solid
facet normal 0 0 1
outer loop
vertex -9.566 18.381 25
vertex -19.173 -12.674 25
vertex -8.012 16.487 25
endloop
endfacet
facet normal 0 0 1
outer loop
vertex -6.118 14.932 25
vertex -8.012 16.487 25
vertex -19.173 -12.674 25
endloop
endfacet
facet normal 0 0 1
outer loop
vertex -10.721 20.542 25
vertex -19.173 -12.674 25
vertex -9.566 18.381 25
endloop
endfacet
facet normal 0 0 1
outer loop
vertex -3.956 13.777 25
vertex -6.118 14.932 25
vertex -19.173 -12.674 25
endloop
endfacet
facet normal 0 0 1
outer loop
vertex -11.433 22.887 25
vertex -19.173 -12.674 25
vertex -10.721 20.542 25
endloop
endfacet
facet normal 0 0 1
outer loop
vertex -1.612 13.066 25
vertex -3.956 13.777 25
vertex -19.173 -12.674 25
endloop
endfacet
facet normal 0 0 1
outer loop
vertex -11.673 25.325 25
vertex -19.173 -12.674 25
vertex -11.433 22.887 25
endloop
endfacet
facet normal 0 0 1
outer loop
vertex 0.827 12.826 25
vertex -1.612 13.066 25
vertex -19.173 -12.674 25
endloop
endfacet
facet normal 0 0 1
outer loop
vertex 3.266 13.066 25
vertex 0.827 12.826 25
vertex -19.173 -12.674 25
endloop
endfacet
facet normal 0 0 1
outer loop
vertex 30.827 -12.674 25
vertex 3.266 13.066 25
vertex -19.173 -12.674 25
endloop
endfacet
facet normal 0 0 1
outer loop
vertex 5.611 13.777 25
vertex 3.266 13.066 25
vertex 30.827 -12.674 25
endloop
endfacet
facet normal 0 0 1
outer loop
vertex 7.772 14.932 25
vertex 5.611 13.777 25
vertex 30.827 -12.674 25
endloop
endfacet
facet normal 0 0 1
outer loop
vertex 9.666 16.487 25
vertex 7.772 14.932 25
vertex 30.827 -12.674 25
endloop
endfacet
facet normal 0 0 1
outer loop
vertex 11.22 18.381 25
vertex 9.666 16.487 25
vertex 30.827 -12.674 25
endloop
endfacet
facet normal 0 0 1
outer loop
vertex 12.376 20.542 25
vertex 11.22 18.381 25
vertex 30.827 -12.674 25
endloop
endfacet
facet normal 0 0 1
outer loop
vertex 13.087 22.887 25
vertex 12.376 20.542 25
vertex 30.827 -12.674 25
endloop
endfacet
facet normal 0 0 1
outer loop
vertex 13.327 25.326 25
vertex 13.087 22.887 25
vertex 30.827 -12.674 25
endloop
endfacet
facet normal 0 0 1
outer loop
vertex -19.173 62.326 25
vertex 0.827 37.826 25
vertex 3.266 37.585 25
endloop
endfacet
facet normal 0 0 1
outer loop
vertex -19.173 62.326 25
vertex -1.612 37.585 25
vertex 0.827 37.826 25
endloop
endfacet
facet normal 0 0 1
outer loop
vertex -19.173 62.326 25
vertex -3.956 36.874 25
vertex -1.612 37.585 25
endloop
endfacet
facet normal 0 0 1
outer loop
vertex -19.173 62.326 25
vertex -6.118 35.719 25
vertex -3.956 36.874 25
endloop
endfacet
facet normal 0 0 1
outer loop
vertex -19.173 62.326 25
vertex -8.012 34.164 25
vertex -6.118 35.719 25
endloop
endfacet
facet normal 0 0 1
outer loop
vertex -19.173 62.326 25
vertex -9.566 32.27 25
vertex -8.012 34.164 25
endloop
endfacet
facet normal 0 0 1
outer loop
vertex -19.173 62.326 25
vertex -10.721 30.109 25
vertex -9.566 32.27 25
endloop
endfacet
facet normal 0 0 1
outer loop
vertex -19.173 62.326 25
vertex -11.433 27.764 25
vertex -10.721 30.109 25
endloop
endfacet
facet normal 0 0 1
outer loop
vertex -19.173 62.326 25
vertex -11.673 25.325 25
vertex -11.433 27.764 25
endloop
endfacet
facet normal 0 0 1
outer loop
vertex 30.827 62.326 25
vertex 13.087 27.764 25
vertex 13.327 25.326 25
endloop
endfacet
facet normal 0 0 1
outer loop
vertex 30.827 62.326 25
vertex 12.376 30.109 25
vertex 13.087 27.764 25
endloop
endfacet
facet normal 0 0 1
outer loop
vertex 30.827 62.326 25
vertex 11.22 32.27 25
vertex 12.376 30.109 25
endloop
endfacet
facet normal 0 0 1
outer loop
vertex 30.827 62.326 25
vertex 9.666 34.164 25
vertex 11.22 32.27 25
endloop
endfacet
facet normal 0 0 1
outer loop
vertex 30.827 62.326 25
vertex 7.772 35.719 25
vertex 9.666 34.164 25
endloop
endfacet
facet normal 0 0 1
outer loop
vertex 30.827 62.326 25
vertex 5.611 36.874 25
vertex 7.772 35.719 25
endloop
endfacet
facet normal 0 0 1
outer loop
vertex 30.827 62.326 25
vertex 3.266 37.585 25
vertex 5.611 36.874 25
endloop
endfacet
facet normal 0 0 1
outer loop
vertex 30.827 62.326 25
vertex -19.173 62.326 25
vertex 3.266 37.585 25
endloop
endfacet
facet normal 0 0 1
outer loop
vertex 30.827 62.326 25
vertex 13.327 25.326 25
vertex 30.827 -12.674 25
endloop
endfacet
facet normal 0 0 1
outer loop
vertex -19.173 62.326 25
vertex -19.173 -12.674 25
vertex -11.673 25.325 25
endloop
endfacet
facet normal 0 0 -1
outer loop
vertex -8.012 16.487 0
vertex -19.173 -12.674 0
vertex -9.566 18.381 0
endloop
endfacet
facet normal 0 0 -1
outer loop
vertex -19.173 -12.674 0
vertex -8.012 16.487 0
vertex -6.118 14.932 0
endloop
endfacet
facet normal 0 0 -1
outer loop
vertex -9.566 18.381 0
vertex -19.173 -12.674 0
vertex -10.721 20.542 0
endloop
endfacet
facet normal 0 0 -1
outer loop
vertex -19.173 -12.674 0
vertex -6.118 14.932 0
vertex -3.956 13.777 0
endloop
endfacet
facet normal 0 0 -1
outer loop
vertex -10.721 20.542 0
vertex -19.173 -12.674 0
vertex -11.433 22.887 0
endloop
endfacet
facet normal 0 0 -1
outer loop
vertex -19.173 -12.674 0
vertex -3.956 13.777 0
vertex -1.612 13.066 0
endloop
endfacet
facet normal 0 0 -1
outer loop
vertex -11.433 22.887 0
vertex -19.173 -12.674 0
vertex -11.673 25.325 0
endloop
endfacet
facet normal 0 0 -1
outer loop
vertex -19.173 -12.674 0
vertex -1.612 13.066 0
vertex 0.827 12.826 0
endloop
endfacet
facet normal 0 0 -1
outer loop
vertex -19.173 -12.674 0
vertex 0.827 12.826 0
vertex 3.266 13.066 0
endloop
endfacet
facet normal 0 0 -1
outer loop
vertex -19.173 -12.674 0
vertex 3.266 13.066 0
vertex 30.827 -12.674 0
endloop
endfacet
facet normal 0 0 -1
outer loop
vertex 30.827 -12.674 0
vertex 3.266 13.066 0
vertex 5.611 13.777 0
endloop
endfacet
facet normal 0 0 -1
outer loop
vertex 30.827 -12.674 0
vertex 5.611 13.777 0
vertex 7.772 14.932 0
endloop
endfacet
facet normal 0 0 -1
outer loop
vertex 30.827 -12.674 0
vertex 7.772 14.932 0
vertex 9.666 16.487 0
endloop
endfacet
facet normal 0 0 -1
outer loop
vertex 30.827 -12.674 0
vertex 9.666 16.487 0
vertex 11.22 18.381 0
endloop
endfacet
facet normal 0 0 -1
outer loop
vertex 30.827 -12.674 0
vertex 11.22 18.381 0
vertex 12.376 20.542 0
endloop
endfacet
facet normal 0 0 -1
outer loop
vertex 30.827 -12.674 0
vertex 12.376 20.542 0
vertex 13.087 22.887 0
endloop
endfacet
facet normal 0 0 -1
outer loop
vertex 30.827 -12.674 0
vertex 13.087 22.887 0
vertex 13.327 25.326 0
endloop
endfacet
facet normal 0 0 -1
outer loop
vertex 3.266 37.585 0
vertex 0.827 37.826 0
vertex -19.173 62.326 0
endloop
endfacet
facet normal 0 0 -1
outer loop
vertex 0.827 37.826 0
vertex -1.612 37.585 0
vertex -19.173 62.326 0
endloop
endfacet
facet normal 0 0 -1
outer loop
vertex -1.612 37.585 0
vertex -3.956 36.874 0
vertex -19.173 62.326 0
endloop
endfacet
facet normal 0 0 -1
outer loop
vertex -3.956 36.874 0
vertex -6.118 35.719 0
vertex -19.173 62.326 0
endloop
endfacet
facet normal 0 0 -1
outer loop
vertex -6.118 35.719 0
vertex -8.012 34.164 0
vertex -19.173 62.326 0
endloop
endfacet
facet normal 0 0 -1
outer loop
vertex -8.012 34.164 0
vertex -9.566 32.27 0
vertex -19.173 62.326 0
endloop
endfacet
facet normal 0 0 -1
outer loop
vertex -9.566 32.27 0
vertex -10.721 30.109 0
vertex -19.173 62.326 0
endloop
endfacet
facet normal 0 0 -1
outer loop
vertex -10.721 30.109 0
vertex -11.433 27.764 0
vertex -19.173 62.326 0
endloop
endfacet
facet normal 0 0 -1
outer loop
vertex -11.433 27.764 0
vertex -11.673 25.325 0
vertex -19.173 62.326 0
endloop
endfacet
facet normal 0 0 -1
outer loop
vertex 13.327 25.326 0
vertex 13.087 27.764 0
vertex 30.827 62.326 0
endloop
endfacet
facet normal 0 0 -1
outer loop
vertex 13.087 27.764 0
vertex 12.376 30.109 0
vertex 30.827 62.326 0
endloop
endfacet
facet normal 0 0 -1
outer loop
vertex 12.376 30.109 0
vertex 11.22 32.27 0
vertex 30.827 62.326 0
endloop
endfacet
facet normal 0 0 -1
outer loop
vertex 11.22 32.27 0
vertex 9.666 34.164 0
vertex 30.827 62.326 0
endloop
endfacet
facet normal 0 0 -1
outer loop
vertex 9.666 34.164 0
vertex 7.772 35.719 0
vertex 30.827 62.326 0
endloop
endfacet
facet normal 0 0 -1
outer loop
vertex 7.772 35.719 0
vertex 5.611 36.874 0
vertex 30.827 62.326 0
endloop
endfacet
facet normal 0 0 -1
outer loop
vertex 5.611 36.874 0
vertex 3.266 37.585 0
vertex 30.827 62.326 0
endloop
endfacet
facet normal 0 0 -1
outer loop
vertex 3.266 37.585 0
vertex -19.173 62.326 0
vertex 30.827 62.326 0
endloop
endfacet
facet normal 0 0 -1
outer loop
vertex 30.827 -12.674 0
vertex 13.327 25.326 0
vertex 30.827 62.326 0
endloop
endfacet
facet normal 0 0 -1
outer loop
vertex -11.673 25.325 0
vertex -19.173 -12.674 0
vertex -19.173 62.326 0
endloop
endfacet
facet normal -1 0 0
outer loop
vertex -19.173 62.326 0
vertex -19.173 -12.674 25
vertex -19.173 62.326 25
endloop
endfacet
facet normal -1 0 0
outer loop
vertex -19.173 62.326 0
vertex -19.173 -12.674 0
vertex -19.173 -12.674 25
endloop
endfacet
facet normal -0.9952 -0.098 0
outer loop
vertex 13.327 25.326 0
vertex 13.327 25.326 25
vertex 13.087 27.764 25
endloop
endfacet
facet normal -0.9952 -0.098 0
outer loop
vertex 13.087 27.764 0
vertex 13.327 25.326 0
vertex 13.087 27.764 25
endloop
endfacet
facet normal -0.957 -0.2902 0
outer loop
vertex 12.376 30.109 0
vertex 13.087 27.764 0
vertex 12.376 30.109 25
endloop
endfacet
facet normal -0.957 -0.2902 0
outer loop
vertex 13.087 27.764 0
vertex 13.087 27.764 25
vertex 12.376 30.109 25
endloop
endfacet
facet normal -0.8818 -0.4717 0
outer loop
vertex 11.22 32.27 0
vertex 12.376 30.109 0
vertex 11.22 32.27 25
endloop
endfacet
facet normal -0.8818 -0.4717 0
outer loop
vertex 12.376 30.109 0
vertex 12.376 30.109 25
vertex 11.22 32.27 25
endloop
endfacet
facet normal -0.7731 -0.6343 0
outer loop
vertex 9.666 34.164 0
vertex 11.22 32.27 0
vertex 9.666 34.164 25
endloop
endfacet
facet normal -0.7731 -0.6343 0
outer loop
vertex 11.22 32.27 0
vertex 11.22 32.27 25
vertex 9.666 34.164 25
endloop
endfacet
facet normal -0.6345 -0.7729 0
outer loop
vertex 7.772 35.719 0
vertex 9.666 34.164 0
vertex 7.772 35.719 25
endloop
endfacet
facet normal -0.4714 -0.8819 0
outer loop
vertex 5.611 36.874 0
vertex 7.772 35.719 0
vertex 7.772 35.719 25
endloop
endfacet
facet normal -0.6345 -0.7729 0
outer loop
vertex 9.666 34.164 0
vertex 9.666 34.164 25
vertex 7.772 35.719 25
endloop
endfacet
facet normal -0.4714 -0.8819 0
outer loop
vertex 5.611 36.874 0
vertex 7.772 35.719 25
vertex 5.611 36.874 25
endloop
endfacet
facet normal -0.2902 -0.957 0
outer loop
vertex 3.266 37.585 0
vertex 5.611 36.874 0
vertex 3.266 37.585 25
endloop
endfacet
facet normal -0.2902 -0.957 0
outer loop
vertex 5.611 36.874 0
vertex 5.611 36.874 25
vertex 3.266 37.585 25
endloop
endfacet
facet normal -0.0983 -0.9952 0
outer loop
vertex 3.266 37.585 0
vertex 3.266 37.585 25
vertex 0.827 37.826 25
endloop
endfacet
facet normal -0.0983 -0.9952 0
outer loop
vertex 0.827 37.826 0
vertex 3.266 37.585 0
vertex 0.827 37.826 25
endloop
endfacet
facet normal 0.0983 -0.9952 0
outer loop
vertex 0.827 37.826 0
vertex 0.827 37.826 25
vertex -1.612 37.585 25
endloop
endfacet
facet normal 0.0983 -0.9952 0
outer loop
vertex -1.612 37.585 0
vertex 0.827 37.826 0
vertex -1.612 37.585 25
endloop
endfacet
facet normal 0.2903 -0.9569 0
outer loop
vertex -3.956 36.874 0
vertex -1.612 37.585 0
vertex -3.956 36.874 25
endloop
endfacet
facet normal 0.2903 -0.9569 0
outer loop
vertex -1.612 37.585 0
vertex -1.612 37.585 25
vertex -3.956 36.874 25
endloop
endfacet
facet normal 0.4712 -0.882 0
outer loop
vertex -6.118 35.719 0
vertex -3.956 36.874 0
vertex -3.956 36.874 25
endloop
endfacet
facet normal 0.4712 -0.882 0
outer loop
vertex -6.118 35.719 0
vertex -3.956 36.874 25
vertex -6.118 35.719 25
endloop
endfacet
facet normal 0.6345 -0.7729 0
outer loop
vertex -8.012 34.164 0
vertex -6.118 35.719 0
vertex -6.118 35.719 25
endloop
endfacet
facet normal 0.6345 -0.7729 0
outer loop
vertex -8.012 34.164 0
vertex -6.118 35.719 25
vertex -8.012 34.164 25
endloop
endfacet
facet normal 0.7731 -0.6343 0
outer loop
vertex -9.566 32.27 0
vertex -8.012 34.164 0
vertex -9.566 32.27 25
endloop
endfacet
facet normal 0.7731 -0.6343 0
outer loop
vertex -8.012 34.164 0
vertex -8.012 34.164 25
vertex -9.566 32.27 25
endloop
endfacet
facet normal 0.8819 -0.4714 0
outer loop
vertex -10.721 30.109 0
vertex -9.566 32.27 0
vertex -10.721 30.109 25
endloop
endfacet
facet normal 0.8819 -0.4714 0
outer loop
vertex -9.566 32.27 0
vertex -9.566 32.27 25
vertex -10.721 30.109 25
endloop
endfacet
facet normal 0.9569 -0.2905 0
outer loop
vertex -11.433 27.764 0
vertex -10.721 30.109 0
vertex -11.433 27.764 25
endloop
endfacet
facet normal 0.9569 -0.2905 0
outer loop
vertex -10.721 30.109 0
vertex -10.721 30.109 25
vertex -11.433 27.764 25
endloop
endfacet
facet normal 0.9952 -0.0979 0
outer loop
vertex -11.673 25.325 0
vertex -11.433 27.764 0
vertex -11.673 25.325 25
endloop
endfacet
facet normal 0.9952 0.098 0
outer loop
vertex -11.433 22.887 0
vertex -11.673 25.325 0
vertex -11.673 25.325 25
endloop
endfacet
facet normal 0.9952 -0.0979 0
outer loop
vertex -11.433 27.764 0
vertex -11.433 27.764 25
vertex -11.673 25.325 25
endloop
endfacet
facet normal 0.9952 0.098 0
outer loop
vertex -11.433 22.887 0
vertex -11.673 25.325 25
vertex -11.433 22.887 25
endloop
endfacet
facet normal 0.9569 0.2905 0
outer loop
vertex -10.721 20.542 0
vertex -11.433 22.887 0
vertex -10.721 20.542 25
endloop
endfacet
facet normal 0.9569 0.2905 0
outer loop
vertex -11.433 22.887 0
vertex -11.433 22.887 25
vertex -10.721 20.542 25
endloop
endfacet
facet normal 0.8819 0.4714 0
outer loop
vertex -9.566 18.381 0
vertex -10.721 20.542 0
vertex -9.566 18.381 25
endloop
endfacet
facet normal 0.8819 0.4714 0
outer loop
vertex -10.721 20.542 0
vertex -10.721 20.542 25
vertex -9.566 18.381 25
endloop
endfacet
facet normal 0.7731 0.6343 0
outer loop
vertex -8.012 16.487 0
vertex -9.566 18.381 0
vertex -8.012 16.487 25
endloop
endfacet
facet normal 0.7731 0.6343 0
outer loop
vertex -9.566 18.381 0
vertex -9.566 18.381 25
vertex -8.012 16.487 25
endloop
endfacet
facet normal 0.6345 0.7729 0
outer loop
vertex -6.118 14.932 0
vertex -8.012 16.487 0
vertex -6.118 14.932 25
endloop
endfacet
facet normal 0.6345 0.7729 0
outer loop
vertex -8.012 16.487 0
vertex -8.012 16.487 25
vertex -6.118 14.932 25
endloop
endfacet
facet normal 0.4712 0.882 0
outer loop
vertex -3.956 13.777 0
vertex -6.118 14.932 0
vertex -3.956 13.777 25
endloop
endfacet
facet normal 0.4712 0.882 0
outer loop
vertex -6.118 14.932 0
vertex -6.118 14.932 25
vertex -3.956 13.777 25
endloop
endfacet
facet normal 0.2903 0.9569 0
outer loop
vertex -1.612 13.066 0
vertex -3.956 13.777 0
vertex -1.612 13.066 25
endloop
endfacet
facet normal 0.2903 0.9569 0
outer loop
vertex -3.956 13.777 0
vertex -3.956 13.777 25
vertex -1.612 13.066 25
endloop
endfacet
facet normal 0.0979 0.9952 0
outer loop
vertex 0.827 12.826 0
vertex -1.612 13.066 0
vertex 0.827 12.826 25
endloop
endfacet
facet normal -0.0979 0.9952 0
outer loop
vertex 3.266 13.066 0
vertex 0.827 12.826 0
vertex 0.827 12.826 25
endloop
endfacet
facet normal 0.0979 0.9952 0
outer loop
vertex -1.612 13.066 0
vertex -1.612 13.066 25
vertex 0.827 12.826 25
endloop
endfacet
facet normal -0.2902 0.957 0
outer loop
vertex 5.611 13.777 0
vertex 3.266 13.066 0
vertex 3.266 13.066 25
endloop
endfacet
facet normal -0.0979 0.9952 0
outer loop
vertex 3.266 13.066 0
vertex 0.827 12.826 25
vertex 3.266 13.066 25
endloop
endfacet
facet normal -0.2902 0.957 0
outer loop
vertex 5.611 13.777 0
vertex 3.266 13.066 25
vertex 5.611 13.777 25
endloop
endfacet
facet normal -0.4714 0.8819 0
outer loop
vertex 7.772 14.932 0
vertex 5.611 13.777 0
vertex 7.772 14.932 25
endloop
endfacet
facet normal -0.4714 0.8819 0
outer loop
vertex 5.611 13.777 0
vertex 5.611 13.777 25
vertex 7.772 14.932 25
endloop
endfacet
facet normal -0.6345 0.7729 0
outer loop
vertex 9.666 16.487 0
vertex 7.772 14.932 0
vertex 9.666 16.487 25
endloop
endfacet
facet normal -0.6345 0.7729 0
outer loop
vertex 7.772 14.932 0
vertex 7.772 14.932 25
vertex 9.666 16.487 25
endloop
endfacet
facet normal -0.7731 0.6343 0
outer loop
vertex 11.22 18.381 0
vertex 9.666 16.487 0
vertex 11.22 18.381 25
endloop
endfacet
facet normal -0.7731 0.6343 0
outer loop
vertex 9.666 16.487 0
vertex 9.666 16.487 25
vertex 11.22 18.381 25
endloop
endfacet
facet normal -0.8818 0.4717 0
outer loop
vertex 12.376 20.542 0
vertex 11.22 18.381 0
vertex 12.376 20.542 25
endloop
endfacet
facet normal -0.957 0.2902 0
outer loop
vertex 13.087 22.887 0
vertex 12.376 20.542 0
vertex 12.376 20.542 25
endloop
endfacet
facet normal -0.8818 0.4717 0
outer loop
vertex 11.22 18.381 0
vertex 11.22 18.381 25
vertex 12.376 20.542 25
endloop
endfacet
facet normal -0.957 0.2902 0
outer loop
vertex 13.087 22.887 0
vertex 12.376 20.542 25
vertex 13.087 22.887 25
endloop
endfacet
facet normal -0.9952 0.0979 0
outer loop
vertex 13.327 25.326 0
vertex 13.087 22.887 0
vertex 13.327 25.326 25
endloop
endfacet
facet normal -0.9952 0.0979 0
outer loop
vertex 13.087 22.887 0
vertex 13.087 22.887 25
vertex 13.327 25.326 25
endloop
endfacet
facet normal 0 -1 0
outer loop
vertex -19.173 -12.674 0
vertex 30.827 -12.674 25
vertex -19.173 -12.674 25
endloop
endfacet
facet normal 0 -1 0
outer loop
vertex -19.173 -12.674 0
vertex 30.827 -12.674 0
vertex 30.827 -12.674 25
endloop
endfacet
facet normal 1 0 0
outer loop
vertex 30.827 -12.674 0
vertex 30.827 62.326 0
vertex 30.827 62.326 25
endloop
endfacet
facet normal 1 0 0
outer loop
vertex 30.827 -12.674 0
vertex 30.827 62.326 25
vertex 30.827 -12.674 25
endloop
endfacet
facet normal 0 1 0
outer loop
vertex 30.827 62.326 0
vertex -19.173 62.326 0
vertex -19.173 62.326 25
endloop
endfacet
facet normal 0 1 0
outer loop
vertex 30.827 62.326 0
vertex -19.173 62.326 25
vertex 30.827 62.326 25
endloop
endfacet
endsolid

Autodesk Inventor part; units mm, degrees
ref_plane "YZ Plane" through (0, 0, 0) normal (1, 0, 0) x (0, 1, 0)
ref_plane "XZ Plane" through (0, 0, 0) normal (0, 1, 0) x (-1, 0, 0)
ref_plane "XY Plane" through (0, 0, 0) normal (0, 0, 1) x (1, 0, 0)
sketch "Sketch1" plane through (0, 0, 0) normal (0, 0, 1) x (1, 0, 0)
  line L0 (-19.1729, 62.3255) -> (30.8271, 62.3255)
  line L1 (30.8271, 62.3255) -> (30.8271, -12.6745)
  line L2 (30.8271, -12.6745) -> (-19.1729, -12.6745)
  line L3 (-19.1729, -12.6745) -> (-19.1729, 62.3255)
  dimension "d0" = 50
  dimension "d1" = 75
extrude "Extrusion1" add sketch "Sketch1" along normal blind 25
sketch "Sketch2" plane through (0, 0, 25) normal (0, 0, 1) x (1, 0, 0)
  circle A0 centre (0.8271, 25.3255) radius 12.5
  point P0 (-19.1729, -12.6745)
  dimension "d4" = 20
  dimension "d5" = 25
  dimension "d8" = 38
extrude "Extrusion2" cut sketch "Sketch2" against normal up to surface (25 mm away)
properties part number "box"
